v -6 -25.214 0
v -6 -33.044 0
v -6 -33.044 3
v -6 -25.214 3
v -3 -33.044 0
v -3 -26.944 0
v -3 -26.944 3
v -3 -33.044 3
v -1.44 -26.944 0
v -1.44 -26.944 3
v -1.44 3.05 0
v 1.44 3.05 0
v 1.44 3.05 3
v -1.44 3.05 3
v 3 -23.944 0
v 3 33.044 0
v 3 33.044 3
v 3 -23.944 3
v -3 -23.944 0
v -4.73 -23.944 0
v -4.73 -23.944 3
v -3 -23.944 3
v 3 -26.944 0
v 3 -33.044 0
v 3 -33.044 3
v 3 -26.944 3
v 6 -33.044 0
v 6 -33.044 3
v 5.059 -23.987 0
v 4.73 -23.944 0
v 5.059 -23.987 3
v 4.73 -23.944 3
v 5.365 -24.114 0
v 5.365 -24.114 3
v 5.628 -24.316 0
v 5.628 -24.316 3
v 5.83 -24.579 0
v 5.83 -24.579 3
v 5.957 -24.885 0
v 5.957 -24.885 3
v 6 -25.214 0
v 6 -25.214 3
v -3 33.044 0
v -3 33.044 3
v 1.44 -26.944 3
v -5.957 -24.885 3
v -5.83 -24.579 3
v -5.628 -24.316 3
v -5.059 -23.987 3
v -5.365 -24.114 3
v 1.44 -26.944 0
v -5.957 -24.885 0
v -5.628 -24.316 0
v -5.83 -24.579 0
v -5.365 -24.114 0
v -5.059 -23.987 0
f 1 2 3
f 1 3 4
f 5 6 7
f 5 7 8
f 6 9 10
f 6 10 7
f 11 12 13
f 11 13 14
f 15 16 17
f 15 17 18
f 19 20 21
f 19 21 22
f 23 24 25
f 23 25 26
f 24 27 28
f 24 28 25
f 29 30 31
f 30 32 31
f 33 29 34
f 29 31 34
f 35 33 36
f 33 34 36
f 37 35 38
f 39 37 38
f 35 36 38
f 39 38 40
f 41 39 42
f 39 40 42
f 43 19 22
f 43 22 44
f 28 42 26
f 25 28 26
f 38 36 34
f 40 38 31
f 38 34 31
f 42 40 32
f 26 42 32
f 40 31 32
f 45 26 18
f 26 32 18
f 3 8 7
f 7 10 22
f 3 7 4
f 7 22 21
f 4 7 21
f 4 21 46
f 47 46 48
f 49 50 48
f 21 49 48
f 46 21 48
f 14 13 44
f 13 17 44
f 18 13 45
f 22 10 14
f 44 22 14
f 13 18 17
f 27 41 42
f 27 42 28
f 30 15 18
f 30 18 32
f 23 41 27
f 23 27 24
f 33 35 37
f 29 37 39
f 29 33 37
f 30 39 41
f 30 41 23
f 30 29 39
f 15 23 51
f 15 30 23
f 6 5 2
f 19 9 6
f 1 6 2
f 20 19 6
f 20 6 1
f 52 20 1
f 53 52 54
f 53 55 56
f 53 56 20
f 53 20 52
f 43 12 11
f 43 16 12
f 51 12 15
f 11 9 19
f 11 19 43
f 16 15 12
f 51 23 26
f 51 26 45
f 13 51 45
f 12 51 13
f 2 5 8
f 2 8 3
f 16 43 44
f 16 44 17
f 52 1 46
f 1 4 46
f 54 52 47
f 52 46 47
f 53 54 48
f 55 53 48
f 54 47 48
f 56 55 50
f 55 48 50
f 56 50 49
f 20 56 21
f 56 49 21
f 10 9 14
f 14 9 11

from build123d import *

# Parameters (mm, degrees)
EXTRUDE_1_DEPTH     = 3
FILLET_1_R          = 1.27
SKETCH_2_W          = 2.88
SKETCH_2_H          = 29.994
CUT_EXTRUDE_1_DEPTH = 3


with BuildPart() as part:
    # 스케치1 → 보스-돌출1 (new body)
    with BuildSketch(Plane.XY):
        Polygon((-3, 33.044), (3, 33.044), (3, -23.944), (6, -23.944), (6, -33.044), (3, -33.044), (3, -26.944), (-3, -26.944), (-3, -33.044), (-6, -33.044), (-6, -23.944), (-3, -23.944), align=None)
    extrude(amount=EXTRUDE_1_DEPTH)

    # 필렛1
    fillet_1_edges = [part.edges().sort_by_distance(p)[0] for p in [
        (6, -23.944, 1.5),
        (-6, -23.944, 1.5),
    ]]
    fillet(fillet_1_edges, radius=FILLET_1_R)

    # 스케치2 → 컷-돌출1 (cut)
    with BuildSketch(Plane(origin=(0, 0, 0), x_dir=(-1, 0, 0), z_dir=(0, 0, -1))):
        with Locations((0, -11.947)):
            Rectangle(SKETCH_2_W, SKETCH_2_H)
    extrude(amount=-CUT_EXTRUDE_1_DEPTH, mode=Mode.SUBTRACT)


solid = part.part
